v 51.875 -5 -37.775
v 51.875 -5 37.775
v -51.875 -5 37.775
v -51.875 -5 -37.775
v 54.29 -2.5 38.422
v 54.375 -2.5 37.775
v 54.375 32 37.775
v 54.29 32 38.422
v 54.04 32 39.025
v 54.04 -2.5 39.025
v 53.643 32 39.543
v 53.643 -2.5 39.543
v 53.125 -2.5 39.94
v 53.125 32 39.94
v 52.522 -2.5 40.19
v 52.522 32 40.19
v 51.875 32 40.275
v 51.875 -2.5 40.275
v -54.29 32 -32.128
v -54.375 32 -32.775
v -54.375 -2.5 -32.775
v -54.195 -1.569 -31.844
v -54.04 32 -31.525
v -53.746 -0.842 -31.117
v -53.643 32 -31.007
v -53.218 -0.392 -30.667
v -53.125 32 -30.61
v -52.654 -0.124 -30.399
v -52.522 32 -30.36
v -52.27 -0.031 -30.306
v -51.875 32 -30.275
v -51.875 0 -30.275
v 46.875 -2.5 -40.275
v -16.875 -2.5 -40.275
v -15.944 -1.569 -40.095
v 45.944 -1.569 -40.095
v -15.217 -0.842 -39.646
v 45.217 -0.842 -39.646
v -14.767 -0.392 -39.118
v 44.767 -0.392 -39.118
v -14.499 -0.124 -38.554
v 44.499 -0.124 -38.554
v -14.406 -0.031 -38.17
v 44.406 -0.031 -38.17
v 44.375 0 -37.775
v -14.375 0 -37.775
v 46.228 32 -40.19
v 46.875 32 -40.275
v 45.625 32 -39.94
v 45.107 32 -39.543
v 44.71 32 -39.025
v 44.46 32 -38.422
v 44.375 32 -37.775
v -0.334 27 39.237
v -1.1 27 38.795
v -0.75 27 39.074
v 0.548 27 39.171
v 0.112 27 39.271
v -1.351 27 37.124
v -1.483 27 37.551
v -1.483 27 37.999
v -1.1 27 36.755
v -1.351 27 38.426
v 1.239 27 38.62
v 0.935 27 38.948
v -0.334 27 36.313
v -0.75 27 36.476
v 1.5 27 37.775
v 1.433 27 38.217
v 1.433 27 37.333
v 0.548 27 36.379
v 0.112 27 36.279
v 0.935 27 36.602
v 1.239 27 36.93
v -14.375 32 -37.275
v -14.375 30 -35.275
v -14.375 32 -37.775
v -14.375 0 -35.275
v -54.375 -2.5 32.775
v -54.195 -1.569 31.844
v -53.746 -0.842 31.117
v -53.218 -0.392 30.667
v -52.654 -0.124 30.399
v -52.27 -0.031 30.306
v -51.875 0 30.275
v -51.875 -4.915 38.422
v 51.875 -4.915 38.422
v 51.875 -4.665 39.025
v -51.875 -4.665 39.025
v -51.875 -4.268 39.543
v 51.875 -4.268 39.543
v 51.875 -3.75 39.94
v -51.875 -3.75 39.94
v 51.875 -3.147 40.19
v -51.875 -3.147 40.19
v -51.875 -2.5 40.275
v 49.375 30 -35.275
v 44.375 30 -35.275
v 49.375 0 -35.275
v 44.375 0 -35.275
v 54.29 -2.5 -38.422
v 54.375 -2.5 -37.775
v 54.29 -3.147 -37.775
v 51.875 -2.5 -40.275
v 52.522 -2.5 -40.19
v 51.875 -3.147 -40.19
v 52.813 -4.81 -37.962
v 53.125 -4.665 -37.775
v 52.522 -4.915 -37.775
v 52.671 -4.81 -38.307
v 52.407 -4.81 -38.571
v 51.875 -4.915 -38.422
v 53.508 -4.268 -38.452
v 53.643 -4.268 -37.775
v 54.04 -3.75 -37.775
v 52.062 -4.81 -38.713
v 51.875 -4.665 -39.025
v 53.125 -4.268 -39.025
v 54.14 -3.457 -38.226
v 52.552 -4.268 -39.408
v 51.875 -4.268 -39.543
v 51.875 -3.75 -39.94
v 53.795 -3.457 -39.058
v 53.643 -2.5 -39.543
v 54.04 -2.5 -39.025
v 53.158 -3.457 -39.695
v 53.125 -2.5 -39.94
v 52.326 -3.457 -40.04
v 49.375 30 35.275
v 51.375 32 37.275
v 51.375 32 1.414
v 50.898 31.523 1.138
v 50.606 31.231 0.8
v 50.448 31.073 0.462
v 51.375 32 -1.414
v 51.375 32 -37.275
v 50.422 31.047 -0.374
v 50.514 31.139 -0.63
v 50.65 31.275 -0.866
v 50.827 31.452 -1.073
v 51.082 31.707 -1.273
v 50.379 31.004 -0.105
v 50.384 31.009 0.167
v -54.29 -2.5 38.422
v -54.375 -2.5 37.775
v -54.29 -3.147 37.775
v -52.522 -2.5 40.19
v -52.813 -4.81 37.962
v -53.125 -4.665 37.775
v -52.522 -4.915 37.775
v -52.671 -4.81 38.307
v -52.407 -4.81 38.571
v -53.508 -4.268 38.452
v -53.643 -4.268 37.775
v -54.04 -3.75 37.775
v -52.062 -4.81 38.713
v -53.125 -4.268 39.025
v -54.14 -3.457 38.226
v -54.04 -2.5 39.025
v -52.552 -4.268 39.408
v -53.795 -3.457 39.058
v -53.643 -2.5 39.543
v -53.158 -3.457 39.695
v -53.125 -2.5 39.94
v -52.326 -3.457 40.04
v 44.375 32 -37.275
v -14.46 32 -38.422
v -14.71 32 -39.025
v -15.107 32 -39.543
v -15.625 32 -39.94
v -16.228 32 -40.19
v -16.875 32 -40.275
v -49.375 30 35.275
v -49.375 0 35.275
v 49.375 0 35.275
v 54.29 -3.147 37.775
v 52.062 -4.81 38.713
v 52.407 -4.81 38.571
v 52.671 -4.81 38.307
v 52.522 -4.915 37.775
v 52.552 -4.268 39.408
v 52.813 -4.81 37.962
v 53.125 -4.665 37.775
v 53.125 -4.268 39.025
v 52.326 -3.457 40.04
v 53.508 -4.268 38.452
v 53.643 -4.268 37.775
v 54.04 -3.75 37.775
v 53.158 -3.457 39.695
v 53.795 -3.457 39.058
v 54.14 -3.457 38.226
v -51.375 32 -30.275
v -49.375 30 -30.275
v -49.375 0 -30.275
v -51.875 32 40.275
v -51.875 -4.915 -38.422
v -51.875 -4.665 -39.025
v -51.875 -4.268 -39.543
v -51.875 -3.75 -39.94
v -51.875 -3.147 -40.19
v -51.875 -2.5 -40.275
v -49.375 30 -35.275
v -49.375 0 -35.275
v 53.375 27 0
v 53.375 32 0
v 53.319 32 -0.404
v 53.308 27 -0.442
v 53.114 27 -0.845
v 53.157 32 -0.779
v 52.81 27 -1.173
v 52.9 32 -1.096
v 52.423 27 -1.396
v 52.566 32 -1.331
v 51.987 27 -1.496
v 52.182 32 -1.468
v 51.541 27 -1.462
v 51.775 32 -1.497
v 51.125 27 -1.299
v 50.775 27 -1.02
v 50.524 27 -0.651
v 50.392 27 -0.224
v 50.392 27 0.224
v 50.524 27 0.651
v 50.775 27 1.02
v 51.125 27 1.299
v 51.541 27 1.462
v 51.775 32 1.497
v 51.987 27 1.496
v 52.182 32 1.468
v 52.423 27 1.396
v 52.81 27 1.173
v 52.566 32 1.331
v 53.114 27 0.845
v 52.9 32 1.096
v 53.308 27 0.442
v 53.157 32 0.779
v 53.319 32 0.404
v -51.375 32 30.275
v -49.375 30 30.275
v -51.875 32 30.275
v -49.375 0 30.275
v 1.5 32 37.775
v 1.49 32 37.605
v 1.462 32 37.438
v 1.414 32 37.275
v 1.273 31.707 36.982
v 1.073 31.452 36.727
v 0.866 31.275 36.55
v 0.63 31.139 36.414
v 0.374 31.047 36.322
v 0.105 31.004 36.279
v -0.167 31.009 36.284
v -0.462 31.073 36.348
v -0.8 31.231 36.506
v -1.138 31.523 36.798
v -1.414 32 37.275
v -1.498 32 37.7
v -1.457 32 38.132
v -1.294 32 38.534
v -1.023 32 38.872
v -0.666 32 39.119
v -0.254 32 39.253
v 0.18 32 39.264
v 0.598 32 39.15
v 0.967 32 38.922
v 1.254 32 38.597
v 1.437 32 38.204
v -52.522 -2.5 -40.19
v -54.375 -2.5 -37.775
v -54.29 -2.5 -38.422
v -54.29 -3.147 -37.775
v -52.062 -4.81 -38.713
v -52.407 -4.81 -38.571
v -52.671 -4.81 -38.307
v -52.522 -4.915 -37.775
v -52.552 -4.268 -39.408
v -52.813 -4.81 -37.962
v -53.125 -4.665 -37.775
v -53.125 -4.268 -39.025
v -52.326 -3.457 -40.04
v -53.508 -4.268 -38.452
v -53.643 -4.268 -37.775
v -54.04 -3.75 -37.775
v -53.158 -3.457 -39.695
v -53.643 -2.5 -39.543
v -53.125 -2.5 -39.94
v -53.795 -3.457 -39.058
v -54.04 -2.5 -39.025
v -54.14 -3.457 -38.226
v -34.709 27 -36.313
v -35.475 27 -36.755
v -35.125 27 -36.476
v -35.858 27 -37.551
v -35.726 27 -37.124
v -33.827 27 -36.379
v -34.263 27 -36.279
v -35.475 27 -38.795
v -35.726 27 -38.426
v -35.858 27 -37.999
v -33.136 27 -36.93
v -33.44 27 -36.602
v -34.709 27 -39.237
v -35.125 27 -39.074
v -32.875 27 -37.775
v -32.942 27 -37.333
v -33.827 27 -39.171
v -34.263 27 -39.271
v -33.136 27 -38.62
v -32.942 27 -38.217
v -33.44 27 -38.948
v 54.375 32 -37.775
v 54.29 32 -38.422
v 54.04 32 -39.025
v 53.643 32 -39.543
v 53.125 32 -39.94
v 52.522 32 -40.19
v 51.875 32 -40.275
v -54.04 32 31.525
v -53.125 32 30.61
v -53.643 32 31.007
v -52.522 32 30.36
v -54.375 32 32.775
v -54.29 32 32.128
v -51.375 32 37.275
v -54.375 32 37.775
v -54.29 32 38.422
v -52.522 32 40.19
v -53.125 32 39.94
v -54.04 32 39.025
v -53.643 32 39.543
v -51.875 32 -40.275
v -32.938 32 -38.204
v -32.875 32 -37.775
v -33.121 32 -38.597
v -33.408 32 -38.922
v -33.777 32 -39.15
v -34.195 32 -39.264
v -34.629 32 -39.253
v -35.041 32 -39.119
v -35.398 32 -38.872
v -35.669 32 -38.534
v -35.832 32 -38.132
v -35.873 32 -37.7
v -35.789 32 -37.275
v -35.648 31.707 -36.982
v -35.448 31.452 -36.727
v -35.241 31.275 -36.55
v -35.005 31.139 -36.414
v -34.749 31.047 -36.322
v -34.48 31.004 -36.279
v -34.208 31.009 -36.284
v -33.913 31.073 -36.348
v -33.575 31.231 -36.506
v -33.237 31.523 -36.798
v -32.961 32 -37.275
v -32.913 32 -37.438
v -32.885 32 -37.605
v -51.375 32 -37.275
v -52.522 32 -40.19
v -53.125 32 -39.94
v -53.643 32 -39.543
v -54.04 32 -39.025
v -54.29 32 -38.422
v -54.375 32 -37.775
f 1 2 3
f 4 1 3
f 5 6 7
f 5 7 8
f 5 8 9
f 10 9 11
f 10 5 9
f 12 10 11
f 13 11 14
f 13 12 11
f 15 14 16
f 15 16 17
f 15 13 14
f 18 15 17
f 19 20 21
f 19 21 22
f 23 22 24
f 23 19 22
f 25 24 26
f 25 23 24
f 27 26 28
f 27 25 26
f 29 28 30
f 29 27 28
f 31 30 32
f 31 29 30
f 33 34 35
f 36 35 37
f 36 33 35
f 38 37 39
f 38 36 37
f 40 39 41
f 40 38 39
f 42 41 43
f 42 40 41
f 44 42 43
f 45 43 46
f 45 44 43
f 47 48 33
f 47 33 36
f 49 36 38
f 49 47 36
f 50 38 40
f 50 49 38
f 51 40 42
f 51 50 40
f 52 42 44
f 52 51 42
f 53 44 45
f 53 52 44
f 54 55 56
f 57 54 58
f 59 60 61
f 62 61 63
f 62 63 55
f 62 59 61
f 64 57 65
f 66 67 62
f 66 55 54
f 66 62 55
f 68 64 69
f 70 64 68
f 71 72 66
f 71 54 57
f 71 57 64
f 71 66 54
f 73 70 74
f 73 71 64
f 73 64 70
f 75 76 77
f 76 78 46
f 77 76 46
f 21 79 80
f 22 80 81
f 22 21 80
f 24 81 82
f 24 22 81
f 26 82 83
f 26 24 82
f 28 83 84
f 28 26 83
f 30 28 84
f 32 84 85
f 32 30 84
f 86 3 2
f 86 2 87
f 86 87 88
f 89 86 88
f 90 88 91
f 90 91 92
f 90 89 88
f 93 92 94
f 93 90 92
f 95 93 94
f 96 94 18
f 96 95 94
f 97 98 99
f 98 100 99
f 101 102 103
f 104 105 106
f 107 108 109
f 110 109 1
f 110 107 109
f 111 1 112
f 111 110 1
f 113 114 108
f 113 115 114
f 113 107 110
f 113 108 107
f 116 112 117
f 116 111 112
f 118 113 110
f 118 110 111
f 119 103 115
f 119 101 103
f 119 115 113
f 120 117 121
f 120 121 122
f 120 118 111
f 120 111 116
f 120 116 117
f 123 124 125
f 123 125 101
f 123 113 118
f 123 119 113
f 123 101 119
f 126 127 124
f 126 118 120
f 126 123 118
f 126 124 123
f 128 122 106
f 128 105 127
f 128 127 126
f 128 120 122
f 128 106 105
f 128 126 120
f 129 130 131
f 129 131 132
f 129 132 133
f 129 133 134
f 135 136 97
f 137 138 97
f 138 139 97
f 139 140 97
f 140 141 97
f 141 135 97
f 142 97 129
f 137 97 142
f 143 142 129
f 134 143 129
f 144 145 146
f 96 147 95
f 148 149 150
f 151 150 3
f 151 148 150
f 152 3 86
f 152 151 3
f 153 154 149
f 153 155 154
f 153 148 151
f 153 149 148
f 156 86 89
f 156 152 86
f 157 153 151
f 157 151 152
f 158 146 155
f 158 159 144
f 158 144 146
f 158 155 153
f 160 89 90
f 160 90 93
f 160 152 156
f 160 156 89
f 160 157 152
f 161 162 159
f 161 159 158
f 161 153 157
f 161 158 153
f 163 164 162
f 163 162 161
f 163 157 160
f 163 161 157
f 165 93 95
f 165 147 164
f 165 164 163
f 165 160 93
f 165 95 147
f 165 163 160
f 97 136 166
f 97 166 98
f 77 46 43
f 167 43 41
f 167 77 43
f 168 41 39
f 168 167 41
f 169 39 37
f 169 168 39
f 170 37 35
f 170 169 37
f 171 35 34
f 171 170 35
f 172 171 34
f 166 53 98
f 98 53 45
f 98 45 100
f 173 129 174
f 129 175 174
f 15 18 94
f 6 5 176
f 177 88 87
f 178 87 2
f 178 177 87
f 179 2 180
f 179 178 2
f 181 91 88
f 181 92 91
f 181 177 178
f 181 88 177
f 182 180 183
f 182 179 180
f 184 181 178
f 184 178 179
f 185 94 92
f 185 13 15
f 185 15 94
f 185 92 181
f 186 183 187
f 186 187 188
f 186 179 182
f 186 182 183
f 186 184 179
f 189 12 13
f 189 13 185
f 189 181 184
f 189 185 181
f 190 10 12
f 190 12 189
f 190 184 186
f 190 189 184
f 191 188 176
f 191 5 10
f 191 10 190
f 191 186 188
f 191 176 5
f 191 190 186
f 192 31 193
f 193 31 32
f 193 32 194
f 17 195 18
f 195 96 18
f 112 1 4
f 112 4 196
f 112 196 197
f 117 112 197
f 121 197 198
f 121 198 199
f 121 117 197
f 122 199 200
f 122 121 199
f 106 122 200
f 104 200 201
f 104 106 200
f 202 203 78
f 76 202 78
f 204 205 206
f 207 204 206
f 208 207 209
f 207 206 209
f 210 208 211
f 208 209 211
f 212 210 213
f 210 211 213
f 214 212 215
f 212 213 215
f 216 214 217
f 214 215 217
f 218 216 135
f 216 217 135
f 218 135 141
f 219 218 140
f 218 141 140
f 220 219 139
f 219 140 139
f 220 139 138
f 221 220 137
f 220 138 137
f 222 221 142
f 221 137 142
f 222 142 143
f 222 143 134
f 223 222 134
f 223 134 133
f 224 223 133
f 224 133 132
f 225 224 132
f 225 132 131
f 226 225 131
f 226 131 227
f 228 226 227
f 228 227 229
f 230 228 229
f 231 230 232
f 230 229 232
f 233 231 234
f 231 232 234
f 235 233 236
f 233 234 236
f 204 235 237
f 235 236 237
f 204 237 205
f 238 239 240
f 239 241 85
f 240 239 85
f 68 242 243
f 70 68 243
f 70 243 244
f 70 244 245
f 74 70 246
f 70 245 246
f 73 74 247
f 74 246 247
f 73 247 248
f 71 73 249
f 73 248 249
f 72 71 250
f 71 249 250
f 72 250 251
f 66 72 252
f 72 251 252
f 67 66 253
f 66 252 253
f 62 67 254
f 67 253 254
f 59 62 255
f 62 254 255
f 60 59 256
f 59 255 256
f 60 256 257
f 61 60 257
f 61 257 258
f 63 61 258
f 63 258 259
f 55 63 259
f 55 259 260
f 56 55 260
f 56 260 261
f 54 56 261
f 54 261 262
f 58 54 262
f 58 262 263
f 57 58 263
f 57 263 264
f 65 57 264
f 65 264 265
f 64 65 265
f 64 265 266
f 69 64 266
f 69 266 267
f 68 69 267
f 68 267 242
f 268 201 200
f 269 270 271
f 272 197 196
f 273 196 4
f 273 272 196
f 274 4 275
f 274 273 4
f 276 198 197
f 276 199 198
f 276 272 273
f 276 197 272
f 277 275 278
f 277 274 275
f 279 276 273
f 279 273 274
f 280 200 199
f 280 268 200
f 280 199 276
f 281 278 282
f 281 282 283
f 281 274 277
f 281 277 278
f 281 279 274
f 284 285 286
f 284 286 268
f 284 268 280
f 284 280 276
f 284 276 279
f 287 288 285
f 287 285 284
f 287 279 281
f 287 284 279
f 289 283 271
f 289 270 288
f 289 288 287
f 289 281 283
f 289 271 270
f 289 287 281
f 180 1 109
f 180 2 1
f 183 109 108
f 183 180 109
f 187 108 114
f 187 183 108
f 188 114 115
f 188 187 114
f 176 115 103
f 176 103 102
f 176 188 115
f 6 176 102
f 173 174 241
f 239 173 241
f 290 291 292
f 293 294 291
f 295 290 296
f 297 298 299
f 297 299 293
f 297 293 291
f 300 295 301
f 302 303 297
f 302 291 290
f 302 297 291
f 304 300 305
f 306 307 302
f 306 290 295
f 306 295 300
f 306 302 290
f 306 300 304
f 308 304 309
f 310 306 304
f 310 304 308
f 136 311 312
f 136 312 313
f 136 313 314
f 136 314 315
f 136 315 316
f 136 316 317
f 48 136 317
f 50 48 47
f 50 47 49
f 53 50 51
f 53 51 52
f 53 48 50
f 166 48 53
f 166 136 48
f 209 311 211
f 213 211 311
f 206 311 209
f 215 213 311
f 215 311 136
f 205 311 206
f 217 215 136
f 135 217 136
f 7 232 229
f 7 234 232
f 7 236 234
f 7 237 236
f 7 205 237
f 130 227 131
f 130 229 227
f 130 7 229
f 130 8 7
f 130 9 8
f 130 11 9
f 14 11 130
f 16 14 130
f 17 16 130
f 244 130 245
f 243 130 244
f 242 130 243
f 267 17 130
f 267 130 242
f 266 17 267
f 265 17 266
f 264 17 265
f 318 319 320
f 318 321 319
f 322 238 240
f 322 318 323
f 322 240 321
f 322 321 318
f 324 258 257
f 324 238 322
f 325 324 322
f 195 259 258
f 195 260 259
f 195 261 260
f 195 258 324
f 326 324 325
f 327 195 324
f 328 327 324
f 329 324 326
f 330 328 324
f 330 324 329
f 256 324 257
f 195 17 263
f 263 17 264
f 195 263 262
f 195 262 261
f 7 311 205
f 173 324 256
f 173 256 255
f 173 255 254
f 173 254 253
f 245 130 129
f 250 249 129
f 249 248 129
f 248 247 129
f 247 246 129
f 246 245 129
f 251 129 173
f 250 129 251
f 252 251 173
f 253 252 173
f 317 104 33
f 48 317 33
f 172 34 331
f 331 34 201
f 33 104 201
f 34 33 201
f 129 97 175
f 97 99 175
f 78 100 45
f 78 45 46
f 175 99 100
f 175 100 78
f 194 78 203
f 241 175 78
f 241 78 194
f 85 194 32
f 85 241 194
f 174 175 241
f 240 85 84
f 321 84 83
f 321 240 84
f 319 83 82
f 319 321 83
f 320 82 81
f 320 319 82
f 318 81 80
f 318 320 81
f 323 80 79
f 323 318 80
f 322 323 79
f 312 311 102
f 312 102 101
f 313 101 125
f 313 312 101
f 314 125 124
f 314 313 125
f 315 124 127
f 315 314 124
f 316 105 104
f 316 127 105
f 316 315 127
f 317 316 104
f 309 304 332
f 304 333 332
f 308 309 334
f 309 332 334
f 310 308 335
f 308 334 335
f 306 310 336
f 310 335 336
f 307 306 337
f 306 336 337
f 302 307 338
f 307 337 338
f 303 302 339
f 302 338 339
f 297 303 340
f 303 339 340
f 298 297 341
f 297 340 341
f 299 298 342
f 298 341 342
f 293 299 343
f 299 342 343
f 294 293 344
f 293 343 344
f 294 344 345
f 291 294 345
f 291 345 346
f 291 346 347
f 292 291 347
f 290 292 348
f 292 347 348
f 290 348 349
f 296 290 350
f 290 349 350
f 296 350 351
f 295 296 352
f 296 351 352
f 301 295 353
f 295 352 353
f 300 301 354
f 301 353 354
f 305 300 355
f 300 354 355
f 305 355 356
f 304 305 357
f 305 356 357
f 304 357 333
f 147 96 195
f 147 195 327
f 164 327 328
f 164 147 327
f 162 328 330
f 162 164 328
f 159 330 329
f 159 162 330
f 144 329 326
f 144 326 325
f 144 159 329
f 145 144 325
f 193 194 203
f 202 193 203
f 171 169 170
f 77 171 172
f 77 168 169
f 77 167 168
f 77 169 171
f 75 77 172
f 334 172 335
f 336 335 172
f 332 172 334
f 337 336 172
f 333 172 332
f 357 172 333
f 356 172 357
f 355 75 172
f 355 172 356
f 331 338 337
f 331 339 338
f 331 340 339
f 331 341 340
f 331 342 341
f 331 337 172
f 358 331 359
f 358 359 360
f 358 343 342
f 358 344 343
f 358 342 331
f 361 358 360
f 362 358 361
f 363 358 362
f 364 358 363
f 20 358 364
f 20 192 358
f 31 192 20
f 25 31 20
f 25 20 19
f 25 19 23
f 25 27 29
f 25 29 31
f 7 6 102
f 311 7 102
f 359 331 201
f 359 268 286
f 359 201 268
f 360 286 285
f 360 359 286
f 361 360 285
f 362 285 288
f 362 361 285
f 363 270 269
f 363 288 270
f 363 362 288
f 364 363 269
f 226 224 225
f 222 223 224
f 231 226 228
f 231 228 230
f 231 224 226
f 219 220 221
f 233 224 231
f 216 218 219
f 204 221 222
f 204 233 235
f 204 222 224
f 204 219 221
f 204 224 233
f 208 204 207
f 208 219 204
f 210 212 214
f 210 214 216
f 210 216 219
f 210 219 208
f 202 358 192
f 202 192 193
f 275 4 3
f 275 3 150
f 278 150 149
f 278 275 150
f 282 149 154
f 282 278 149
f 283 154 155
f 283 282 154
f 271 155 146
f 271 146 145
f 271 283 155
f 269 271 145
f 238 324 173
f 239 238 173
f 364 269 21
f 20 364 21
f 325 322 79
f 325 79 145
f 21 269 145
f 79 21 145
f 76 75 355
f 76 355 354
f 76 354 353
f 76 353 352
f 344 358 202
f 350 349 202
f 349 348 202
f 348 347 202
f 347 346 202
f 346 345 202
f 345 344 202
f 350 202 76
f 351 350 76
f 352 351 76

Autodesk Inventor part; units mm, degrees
ref_plane "YZ Plane" through (0, 0, 0) normal (1, 0, 0) x (0, 1, 0)
ref_plane "XZ Plane" through (0, 0, 0) normal (0, 1, 0) x (-1, 0, 0)
ref_plane "XY Plane" through (0, 0, 0) normal (0, 0, 1) x (1, 0, 0)
sketch "스케치2" plane through (0, 0, 0) normal (0, 1, 0) x (-1, 0, 0)
  line L0 (-49.375, 35.275) -> (49.375, 35.275)
  line L1 (49.375, 35.275) -> (49.375, -35.275)
  line L2 (49.375, -35.275) -> (-49.375, -35.275)
  line L3 (-49.375, -35.275) -> (-49.375, 35.275)
  line L4 (-49.375, 35.275) -> (49.375, -35.275) construction
  line L5 (49.375, 35.275) -> (-49.375, -35.275) construction
  line L6 (-54.375, -40.275) -> (54.375, -40.275)
  line L7 (54.375, -40.275) -> (54.375, 40.275)
  line L8 (54.375, 40.275) -> (-54.375, 40.275)
  line L9 (-54.375, 40.275) -> (-54.375, -40.275)
  point P0 (0, 0)
  dimension "d0" = 98.75
  dimension "d1" = 70.55
  dimension "d2" = 5
extrude "돌출1" add sketch "스케치2" along normal blind 32
sketch "스케치3" plane through (0, 0, 0) normal (0, 1, 0) x (-1, 0, 0)
  line L0 (-54.375, 40.275) -> (-54.375, -40.275) construction
  line L1 (54.375, -40.275) -> (-54.375, -40.275)
  line L2 (-54.375, -40.275) -> (-54.375, 40.275)
  line L3 (-54.375, 40.275) -> (54.375, 40.275)
  line L4 (54.375, 40.275) -> (54.375, -40.275)
  line L5 (54.375, -40.275) -> (-54.375, 40.275) construction
  line L6 (-54.375, -40.275) -> (54.375, 40.275) construction
  point P0 (0, 0)
extrude "돌출2" add sketch "스케치3" against normal blind 5
sketch "스케치4" plane through (0, 0, 0) normal (0, 1, 0) x (-1, 0, 0)
  line L0 (49.375, 35.275) -> (49.375, -35.275) construction
  line L1 (54.375, -40.275) -> (54.375, 40.275) construction
  line L2 (49.375, 30.275) -> (54.375, 30.275)
  line L3 (54.375, 30.275) -> (54.375, -30.275)
  line L4 (54.375, -30.275) -> (49.375, -30.275)
  line L5 (49.375, -30.275) -> (49.375, 30.275)
  line L6 (-49.375, 35.275) -> (49.375, 35.275) construction
  line L7 (49.375, -35.275) -> (-49.375, -35.275) construction
  line L8 (54.375, -40.275) -> (-54.375, -40.275) construction
  line L9 (-44.375, -35.275) -> (14.375, -35.275)
  line L10 (14.375, -35.275) -> (14.375, -40.275)
  line L11 (14.375, -40.275) -> (-44.375, -40.275)
  line L12 (-44.375, -40.275) -> (-44.375, -35.275)
  line L13 (-49.375, -35.275) -> (-49.375, 35.275) construction
  point P0 (0, 0)
  dimension "d7" = 5
  dimension "d8" = 5
  dimension "d11" = 5
  dimension "d12" = 35
extrude "돌출3" cut sketch "스케치4" along normal through all
sketch "스케치5" plane through (0, 32, 0) normal (0, 1, 0) x (1, 0, 0)
  line L0 (49.375, 35.275) -> (49.375, -35.275) construction
  line L1 (49.375, -35.275) -> (-49.375, -35.275) construction
  circle A0 centre (0, -37.775) radius 1.5
  circle A1 centre (51.875, 0) radius 1.5
  circle A2 centre (-34.375, 37.775) radius 1.5
  line L2 (-49.375, 35.275) -> (-14.375, 35.275) construction
  line L3 (-54.375, 40.275) -> (-54.375, 30.275) construction
  point P0 (0, 0)
  dimension "d17" = 3
  dimension "d18" = 2.5
  dimension "d19" = 3
  dimension "d20" = 2.5
  dimension "d21" = 3
  dimension "d22" = 2.5
  dimension "d23" = 20
extrude "돌출4" cut sketch "스케치5" against normal blind 5
fillet "모깎기1" radius 2.5 14 edges at (-54.375, 13.5, 40.275) (54.375, 13.5, 40.275) (54.375, 13.5, -40.275) (-54.375, 13.5, -40.275) (-54.375, -5, 0) (0, -5, -40.275) (0, -5, 40.275) (54.375, -5, 0) (-14.375, 16, -40.275) (15, 0, -40.275) (44.375, 16, -40.275) (-54.375, 16, 30.275) (-54.375, 0, 0) (-54.375, 16, -30.275)
chamfer "모따기1" distance 2 angle 45 6 edges at (-31.875, 32, -35.275) (-49.375, 32, -32.775) (-49.375, 32, 32.775) (0, 32, 35.275) (49.375, 32, 0) (46.875, 32, -35.275)
properties part number "housing_bottom"
